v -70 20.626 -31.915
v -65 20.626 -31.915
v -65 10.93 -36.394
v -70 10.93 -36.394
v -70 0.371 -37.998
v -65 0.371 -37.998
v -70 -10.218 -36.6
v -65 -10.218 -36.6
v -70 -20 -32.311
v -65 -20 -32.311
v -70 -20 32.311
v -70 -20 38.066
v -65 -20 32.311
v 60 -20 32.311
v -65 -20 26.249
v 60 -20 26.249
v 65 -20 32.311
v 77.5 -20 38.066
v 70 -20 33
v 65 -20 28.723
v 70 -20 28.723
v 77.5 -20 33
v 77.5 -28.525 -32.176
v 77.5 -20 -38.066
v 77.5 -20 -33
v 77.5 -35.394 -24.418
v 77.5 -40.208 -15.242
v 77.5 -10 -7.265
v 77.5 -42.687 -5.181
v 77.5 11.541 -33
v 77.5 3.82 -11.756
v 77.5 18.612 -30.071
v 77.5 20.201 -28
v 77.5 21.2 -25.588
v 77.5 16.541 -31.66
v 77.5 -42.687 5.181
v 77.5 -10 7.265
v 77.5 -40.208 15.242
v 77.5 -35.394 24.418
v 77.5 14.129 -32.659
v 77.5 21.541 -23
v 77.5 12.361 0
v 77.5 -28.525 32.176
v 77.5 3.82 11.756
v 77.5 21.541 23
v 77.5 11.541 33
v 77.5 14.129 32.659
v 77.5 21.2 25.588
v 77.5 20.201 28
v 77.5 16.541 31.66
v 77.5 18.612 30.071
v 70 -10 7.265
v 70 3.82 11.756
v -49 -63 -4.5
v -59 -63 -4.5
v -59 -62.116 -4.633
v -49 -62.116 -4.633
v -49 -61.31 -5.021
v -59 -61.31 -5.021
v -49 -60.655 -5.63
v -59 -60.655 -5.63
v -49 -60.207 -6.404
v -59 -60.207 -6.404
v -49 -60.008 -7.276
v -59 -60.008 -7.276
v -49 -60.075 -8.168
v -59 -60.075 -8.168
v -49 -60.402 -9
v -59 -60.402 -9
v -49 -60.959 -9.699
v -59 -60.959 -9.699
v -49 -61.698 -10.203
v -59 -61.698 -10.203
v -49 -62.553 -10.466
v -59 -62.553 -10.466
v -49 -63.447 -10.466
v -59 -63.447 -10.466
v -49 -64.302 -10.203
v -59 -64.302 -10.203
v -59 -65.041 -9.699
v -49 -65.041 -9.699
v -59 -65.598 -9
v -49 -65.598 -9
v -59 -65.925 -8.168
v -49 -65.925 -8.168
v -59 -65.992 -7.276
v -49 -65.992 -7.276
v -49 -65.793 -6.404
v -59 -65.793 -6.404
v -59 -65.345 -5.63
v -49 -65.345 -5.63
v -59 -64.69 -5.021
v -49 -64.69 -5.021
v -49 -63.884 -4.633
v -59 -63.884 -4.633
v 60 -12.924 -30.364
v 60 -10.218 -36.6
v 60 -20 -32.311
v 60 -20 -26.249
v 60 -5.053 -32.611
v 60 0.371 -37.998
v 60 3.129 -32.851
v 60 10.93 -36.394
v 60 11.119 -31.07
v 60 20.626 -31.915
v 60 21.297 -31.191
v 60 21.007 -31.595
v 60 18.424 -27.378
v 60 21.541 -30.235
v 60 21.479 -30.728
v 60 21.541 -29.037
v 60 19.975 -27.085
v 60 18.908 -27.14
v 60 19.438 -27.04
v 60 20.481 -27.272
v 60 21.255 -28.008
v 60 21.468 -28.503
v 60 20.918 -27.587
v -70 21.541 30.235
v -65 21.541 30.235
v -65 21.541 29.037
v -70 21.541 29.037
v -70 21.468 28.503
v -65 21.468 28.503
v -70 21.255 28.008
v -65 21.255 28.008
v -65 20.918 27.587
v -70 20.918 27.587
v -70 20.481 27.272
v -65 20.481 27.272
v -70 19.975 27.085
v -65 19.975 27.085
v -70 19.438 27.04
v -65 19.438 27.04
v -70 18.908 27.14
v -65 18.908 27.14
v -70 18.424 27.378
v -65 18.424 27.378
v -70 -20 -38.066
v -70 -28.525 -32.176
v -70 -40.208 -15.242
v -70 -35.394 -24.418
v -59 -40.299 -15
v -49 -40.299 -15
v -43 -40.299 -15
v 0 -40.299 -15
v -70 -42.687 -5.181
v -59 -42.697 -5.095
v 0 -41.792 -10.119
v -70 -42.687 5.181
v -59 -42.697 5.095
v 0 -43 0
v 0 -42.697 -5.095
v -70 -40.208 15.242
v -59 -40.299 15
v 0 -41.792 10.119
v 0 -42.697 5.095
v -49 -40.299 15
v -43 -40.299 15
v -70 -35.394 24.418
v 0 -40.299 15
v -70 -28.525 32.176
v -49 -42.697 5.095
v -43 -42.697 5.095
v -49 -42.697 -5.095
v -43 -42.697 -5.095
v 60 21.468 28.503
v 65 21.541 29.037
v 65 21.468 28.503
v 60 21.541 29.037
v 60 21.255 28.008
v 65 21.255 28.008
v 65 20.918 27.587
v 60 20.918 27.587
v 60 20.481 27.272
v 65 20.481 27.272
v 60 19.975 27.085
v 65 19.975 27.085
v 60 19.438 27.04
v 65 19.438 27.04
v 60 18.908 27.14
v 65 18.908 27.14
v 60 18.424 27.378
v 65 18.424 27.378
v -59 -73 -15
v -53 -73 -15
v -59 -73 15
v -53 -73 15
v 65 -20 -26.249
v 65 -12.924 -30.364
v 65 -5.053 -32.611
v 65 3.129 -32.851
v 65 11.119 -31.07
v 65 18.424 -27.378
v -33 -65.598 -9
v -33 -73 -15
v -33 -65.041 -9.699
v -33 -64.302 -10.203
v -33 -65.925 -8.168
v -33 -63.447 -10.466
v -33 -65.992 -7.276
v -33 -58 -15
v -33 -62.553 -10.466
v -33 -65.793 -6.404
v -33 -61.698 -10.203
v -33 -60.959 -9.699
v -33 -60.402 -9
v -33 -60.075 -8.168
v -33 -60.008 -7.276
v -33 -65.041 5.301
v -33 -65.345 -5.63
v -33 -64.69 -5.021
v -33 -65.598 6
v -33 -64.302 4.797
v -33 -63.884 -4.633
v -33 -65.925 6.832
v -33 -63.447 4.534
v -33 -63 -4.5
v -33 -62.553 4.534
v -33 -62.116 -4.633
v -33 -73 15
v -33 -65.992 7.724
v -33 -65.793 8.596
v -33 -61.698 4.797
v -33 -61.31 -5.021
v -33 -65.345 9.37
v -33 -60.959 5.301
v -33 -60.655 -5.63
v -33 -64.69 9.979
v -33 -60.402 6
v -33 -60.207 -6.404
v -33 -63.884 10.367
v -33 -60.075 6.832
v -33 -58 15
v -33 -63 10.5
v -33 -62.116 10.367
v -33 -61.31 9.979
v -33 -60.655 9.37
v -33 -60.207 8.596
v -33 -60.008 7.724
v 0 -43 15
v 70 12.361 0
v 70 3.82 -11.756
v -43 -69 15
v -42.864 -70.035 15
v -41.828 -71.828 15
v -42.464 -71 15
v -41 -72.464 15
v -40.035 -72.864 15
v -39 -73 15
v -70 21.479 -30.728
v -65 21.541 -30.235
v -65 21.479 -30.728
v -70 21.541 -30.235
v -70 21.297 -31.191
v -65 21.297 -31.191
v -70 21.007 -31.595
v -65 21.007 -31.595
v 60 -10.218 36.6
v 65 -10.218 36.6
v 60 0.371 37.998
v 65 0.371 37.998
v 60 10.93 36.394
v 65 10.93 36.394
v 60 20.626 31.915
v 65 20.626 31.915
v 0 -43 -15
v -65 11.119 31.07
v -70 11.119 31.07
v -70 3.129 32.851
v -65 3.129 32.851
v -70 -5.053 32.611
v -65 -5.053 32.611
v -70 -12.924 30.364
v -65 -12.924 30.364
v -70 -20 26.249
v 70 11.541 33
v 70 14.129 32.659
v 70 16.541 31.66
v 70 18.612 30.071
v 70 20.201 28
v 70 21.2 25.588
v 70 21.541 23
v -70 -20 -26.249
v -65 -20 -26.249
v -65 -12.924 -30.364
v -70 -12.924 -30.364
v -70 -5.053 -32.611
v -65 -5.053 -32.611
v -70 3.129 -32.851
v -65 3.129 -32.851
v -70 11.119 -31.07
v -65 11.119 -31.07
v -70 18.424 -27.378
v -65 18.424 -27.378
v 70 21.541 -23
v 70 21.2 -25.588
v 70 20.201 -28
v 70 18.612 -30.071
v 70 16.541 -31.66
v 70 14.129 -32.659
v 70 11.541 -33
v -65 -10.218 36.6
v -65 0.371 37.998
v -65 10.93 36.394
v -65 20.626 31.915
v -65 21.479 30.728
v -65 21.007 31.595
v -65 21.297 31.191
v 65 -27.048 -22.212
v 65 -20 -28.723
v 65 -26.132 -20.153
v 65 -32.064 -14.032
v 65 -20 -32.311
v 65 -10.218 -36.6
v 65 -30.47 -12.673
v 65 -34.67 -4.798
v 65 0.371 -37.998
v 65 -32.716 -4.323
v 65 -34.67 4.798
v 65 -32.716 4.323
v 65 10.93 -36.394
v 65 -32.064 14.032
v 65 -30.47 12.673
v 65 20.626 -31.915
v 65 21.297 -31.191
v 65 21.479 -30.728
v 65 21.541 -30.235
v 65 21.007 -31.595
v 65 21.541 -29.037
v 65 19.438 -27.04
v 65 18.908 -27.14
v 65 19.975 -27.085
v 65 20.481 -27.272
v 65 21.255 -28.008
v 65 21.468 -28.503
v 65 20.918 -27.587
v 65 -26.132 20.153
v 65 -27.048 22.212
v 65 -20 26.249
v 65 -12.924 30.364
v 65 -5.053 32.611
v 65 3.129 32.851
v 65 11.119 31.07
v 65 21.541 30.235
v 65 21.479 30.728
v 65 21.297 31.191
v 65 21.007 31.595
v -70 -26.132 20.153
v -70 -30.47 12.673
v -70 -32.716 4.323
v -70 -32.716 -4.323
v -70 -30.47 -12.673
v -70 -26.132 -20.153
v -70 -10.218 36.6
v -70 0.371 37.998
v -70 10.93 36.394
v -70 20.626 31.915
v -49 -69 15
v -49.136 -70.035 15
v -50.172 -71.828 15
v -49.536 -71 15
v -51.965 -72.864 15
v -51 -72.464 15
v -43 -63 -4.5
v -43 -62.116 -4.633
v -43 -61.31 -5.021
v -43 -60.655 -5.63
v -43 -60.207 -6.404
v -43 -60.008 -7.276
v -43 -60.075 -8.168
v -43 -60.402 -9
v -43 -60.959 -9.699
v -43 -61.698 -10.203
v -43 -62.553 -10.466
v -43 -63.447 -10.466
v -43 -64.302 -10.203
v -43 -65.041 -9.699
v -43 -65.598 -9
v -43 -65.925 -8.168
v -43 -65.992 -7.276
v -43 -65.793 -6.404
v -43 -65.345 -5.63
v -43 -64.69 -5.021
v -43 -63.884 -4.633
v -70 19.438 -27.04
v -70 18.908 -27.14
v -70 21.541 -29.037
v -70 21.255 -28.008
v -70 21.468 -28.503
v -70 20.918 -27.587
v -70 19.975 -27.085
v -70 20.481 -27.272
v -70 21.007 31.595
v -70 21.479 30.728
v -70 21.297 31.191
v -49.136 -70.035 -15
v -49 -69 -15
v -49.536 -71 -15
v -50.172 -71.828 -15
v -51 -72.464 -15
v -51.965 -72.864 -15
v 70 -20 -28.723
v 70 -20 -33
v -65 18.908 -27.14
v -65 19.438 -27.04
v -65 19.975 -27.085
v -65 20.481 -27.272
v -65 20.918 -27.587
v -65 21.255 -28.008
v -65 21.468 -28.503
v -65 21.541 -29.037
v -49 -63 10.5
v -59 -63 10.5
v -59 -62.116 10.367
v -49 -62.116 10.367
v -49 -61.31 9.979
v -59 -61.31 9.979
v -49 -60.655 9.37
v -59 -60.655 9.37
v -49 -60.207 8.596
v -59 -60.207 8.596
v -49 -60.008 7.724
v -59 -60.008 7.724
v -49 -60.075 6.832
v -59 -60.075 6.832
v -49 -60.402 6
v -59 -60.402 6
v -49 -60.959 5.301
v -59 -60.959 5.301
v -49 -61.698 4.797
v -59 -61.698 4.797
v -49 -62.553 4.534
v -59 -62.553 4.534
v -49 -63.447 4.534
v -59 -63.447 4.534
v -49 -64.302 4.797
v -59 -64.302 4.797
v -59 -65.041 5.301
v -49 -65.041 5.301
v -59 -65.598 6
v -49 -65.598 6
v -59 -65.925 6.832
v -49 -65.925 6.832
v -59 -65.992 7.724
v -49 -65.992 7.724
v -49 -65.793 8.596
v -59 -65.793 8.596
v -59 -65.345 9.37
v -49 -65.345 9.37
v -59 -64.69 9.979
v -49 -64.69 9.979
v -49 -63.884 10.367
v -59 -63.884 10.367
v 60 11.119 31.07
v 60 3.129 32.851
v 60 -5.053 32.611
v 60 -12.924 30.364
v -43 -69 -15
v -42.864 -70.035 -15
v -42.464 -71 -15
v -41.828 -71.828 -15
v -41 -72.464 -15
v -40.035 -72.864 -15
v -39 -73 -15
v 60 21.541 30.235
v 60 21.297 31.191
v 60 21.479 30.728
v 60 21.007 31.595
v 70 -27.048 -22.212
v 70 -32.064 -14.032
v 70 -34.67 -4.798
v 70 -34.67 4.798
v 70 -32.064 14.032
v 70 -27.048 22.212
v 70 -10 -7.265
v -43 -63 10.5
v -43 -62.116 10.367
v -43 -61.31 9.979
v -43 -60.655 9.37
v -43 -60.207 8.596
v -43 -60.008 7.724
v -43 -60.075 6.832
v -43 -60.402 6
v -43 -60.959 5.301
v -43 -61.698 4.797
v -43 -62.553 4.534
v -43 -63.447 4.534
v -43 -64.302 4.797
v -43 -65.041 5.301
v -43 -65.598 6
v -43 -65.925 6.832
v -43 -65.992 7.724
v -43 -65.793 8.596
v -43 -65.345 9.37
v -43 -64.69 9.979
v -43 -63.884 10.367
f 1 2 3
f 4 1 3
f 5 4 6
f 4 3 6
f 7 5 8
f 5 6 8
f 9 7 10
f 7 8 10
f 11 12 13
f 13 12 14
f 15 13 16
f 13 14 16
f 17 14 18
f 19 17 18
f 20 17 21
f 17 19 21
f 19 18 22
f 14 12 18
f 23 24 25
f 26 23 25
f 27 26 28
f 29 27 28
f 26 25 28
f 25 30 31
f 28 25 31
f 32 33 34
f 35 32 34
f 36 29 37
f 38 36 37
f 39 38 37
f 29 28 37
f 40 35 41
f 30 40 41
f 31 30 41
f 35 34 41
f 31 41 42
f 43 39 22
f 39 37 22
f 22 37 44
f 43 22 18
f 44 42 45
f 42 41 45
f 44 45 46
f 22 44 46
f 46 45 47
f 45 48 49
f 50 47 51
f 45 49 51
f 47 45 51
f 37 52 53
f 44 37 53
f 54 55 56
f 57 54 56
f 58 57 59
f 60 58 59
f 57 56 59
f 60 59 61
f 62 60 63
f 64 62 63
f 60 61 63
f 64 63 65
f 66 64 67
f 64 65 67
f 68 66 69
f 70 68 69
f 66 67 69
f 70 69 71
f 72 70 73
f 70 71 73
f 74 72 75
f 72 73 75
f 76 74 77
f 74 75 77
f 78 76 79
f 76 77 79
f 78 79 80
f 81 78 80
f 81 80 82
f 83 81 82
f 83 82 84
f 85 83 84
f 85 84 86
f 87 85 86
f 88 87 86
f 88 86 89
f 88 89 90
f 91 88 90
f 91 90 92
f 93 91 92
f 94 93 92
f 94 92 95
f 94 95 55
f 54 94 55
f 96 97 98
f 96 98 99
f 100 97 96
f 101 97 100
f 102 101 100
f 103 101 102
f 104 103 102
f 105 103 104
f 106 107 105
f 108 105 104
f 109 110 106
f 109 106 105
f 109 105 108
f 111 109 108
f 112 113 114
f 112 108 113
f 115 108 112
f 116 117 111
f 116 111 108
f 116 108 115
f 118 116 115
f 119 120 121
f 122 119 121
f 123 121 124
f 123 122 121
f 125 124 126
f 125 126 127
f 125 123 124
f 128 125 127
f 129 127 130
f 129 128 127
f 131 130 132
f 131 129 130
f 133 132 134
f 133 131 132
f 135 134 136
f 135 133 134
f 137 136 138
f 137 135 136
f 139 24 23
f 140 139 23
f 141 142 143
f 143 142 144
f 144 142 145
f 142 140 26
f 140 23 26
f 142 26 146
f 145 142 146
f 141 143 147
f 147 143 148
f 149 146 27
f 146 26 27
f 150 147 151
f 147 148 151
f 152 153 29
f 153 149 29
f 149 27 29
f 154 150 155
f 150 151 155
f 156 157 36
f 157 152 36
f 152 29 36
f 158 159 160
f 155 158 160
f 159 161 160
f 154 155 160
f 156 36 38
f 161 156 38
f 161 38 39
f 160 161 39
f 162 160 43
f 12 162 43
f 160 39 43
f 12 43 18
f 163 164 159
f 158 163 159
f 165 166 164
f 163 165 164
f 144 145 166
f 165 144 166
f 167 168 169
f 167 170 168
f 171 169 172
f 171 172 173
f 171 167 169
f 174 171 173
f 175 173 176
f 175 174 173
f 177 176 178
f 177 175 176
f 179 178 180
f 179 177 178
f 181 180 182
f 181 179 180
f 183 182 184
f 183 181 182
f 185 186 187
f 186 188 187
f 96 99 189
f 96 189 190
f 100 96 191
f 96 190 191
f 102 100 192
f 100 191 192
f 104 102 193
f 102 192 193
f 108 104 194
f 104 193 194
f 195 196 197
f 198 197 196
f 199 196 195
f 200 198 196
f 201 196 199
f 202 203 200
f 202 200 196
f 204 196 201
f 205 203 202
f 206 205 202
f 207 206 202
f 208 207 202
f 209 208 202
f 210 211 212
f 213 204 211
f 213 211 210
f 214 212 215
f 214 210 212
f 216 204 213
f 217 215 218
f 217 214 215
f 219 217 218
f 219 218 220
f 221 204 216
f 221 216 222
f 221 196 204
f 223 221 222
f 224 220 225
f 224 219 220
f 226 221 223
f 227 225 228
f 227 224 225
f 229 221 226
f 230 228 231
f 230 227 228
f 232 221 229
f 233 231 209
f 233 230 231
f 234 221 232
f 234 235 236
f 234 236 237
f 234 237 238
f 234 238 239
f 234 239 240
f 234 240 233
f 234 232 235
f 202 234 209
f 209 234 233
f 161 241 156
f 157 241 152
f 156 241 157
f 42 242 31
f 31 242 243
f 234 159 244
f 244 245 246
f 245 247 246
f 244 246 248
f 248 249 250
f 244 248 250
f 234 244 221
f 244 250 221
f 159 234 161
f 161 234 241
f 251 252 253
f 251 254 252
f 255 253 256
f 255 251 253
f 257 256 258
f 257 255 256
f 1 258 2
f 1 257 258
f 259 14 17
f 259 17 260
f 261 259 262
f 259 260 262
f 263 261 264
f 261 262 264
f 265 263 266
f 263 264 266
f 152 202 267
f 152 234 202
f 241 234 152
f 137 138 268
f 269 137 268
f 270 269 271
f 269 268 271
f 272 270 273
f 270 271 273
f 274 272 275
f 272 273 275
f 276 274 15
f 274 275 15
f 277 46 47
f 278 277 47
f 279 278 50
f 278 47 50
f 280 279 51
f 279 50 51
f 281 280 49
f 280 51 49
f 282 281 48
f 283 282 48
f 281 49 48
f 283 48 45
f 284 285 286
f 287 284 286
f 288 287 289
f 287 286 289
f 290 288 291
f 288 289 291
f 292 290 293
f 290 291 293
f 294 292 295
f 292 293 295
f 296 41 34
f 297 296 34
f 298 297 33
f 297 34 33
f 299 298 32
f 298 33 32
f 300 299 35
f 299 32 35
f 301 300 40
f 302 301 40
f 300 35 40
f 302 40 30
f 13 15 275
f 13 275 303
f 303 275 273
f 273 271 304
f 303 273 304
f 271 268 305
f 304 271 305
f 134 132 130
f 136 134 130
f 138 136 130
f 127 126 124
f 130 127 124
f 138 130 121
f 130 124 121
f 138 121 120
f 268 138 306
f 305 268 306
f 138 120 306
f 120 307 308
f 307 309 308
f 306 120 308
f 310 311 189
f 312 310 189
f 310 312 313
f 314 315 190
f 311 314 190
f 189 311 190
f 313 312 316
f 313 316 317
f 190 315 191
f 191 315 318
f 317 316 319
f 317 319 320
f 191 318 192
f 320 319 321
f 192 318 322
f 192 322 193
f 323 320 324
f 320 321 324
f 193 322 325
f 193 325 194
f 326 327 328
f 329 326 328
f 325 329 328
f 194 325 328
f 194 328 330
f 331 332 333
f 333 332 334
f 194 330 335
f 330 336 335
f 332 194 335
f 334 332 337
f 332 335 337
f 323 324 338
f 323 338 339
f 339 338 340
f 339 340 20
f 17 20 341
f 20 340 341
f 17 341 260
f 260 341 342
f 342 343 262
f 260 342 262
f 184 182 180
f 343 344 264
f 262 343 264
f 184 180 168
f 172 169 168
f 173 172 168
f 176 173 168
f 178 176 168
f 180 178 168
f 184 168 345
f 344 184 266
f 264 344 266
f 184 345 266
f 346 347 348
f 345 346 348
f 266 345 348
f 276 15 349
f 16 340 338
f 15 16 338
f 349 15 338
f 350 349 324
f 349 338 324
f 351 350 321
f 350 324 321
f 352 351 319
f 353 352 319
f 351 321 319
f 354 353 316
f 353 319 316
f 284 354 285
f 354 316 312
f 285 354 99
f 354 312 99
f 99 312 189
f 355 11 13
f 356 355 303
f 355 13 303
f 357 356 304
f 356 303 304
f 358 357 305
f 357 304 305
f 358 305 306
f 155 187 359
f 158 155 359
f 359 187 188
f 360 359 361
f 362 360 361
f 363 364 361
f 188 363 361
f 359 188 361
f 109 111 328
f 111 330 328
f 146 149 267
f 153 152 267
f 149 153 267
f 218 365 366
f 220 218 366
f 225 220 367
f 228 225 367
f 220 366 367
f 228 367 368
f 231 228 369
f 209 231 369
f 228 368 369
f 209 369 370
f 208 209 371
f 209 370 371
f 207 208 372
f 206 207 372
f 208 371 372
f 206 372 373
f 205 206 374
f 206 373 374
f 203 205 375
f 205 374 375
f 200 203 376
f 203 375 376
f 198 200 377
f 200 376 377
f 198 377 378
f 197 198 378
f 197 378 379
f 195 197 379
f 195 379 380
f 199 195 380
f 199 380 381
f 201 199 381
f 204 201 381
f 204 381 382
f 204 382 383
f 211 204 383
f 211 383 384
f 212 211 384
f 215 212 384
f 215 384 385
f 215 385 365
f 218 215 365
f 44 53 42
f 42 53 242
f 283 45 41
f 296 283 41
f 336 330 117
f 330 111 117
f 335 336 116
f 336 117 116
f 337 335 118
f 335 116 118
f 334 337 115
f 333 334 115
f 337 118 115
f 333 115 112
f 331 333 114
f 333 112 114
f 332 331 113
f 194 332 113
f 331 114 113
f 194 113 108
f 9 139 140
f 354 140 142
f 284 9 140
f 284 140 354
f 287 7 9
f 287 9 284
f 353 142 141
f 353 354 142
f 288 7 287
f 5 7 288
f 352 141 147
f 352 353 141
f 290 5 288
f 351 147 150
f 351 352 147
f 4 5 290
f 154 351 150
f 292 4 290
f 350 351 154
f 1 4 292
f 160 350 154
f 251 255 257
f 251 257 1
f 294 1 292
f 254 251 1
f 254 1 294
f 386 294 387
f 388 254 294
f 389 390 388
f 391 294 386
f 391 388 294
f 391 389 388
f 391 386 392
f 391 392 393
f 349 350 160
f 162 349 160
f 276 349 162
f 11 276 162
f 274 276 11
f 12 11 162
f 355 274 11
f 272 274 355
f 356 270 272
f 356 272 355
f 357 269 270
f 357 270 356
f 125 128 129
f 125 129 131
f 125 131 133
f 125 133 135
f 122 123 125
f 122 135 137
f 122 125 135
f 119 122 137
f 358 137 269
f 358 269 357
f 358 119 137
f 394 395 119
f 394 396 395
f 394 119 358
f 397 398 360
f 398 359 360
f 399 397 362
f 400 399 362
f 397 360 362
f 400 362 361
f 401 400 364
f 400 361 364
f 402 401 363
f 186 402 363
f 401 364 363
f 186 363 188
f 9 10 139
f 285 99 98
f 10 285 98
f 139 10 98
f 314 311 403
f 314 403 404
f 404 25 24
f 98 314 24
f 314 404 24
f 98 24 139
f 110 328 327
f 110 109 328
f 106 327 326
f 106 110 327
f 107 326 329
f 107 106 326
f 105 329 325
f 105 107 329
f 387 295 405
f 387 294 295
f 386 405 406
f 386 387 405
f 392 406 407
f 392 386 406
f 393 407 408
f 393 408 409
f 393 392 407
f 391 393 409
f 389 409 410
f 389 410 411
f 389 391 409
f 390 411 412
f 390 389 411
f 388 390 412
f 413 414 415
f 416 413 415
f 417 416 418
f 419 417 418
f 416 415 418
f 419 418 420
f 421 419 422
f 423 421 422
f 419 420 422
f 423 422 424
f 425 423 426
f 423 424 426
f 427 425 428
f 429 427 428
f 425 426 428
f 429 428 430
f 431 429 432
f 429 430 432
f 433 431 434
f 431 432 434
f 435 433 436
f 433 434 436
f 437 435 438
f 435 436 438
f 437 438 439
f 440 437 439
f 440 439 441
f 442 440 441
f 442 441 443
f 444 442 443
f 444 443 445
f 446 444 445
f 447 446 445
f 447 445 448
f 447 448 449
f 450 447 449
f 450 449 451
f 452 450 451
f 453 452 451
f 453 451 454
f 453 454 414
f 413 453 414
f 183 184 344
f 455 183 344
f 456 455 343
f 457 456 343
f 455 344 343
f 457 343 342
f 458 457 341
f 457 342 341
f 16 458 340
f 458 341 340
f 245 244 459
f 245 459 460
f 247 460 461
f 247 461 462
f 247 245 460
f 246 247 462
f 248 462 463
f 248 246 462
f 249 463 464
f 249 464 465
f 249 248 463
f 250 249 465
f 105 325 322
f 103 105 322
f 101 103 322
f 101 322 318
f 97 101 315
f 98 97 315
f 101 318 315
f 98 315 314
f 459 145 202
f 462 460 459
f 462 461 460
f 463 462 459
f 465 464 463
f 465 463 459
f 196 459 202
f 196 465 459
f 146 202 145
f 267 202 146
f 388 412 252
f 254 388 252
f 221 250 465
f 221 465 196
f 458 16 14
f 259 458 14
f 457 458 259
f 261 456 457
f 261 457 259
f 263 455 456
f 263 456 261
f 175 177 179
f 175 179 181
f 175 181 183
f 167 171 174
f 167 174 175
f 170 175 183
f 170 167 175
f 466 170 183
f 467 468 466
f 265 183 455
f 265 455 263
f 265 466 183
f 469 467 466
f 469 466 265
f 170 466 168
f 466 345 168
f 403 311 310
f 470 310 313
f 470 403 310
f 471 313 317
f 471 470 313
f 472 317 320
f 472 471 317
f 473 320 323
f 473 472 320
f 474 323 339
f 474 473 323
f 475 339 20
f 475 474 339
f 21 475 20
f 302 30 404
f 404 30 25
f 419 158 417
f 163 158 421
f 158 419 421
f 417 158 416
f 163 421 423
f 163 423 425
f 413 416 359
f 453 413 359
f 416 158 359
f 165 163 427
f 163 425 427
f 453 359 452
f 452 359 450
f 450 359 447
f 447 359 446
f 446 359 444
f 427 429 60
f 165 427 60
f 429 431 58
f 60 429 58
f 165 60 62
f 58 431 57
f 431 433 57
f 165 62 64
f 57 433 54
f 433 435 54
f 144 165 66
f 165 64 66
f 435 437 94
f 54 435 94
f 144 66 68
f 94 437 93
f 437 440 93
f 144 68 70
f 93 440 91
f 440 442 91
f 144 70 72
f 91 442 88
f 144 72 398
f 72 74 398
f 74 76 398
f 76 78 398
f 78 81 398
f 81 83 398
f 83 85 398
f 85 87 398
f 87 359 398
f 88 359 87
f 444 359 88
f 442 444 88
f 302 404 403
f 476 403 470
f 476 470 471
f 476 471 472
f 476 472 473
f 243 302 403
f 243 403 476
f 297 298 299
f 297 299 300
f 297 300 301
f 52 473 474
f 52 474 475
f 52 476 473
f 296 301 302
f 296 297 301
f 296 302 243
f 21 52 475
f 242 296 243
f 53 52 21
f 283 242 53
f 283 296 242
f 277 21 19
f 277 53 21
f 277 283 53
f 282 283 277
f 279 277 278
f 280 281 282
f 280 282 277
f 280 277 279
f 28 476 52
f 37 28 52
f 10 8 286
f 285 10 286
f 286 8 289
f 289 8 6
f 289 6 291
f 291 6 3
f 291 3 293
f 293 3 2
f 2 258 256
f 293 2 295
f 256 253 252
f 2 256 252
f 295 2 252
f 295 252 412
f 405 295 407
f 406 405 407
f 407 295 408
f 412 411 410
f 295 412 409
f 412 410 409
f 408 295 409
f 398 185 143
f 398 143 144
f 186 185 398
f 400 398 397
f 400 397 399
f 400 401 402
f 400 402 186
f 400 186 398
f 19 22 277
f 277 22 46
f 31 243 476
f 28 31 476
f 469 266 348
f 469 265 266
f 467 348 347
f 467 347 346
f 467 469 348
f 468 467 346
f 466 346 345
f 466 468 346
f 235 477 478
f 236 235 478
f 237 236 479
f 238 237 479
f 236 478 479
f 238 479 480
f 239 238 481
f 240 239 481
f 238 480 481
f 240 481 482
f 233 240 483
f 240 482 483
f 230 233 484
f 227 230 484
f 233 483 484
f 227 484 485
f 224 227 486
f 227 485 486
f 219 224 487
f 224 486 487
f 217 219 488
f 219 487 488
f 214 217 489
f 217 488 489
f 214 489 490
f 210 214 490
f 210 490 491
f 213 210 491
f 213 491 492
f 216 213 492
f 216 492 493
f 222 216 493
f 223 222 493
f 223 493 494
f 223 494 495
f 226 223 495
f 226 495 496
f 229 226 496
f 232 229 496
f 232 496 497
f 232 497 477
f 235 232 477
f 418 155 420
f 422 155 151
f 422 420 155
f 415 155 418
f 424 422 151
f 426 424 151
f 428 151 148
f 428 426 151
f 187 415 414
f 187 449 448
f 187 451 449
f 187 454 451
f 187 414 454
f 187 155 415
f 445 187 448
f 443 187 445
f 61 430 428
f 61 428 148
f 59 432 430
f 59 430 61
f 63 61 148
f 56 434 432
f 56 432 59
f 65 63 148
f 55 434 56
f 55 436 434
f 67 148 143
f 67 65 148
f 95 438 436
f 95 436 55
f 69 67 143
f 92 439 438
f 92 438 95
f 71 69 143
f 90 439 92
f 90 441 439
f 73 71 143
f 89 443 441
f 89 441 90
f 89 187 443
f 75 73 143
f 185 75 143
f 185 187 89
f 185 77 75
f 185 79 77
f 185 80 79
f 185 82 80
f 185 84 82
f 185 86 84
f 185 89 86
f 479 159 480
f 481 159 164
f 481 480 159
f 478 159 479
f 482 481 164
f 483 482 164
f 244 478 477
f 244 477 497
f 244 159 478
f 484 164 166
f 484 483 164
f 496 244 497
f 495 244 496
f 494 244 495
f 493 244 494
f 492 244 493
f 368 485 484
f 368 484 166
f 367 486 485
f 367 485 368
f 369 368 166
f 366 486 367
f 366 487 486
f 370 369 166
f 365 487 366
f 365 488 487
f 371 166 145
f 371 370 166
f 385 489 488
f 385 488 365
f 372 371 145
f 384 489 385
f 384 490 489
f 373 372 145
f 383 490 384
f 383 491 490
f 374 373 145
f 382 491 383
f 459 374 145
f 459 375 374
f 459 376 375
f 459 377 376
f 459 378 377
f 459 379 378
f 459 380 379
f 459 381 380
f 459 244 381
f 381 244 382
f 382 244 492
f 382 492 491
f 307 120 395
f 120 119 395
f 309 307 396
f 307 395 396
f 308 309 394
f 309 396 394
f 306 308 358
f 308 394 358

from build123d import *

# Parameters (mm, degrees)
BOSS_EXTRUDE1_DEPTH   = 70
BOSS_EXTRUDE2_START   = -5
BOSS_EXTRUDE2_DEPTH   = 5
BOSS_EXTRUDE3_START   = 7.5
BOSS_EXTRUDE3_DEPTH   = 7.5
BOSS_EXTRUDE4_DEPTH   = 15
BOSS_EXTRUDE4_2_DEPTH = 15
BOSS_EXTRUDE6_REACH   = 109.8
SKETCH5_W             = 43
SKETCH5_H             = 30
SKETCH5_W_2           = 10
CUT_EXTRUDE1_REACH    = 161.406
SKETCH6_R             = 3
SKETCH7_R             = 35
CUT_EXTRUDE2_DEPTH    = 5
LPATTERN1_COUNT       = 2
LPATTERN1_PITCH       = 130
FILLET1_R             = 2
CUT_EXTRUDE3_REACH    = 164.413


with BuildPart() as part:
    # Sketch1 → Boss-Extrude1 (new, symmetric)
    with BuildSketch(Plane(origin=(0, 0, 0), x_dir=(0, 0, -1), z_dir=(1, 0, 0))):
        with BuildLine():
            Line((-38.065732621, -20), (-26.248809497, -20))
            ThreePointArc((-26.248809497, -20), (0, -33), (26.248809497, -20))
            Line((26.248809497, -20), (38.065732621, -20))
            ThreePointArc((38.065732621, -20), (0, -43), (-38.065732621, -20))
        make_face()
    extrude(amount=BOSS_EXTRUDE1_DEPTH, both=True)

    # Sketch2 → Boss-Extrude2 (add)
    with BuildSketch(Plane(origin=(70, 0, 0), x_dir=(0, 0, -1), z_dir=(1, 0, 0)).offset(BOSS_EXTRUDE2_START)):
        with BuildLine():
            Line((-31.304951685, 21.540659229), (-25, 21.540659229))
            ThreePointArc((-25, 21.540659229), (0, -33), (25, 21.540659229))
            Line((25, 21.540659229), (31.304951685, 21.540659229))
            ThreePointArc((31.304951685, 21.540659229), (0, -38), (-31.304951685, 21.540659229))
        make_face()
    boss_extrude2 = extrude(amount=-BOSS_EXTRUDE2_DEPTH)

    # Sketch3 → Boss-Extrude3 (add)
    with BuildSketch(Plane(origin=(70, 0, 0), x_dir=(0, 0, -1), z_dir=(1, 0, 0)).offset(BOSS_EXTRUDE3_START)):
        with BuildLine():
            Line((-33, -20), (-33, 11.540659229))
            ThreePointArc((-33, 11.540659229), (-30.071067812, 18.61172704), (-23, 21.540659229))
            Line((-23, 21.540659229), (23, 21.540659229))
            ThreePointArc((23, 21.540659229), (30.071067812, 18.61172704), (33, 11.540659229))
            Line((33, 11.540659229), (33, -20))
            Line((33, -20), (38.065732621, -20))
            ThreePointArc((38.065732621, -20), (0, -43), (-38.065732621, -20))
            Line((-38.065732621, -20), (-33, -20))
        make_face()
    extrude(amount=-BOSS_EXTRUDE3_DEPTH)

    # Sketch5 → Boss-Extrude6 (add, up to next)
    with BuildSketch(Plane(origin=(0, -43, 0), x_dir=(1, 0, 0), z_dir=(0, 1, 0)), mode=Mode.PRIVATE) as boss_extrude6_sk1:
        with Locations((-21.5, 0)):
            Rectangle(SKETCH5_W, SKETCH5_H)
    boss_extrude6_tool1 = extrude(boss_extrude6_sk1.sketch, amount=BOSS_EXTRUDE6_REACH, mode=Mode.PRIVATE) - part.part
    # Sketch5 → Boss-Extrude6 (add, up to next)
    with BuildSketch(Plane(origin=(0, -43, 0), x_dir=(1, 0, 0), z_dir=(0, 1, 0)), mode=Mode.PRIVATE) as boss_extrude6_sk2:
        with Locations((-54, 0)):
            Rectangle(SKETCH5_W_2, SKETCH5_H)
    boss_extrude6_tool2 = extrude(boss_extrude6_sk2.sketch, amount=BOSS_EXTRUDE6_REACH, mode=Mode.PRIVATE) - part.part


with BuildPart() as body_2:
    # Sketch4 → Boss-Extrude4 (new, symmetric)
    with BuildSketch(Plane.XY):
        with BuildLine():
            Line((-49, -43), (-49, -69))
            ThreePointArc((-49, -69), (-50.171572875, -71.828427125), (-53, -73))
            Line((-53, -73), (-59, -73))
            Line((-59, -73), (-59, -43))
            Line((-59, -43), (-49, -43))
        make_face()
    extrude(amount=BOSS_EXTRUDE4_DEPTH, both=True)


with BuildPart() as body_3:
    # Sketch4 → Boss-Extrude4 2 (new, symmetric)
    with BuildSketch(Plane.XY):
        with BuildLine():
            Line((-33, -43), (-43, -43))
            Line((-43, -43), (-43, -69))
            ThreePointArc((-43, -69), (-41.828427125, -71.828427125), (-39, -73))
            Line((-39, -73), (-33, -73))
            Line((-33, -73), (-33, -58))
            Line((-33, -58), (0, -43))
            Line((0, -43), (-33, -43))
        make_face()
    extrude(amount=BOSS_EXTRUDE4_2_DEPTH, both=True)


with BuildPart() as part_1:
    add(part.part)

    add(body_2.part)  # Boss-Extrude6 merges body 2

    add(body_3.part)  # Boss-Extrude6 merges body 3
    add(boss_extrude6_tool1.solids().sort_by_distance((-21.5, -43, 0))[0])
    add(boss_extrude6_tool1.solids().sort_by_distance((-21.5, -43, 0))[1])
    add(boss_extrude6_tool2.solids().sort_by_distance((-54, -43, 0))[0])
    add(boss_extrude6_tool2.solids().sort_by_distance((-54, -43, 0))[1])

    # Cut-Extrude1: up to this face of the body (flat: up to its plane)
    cut_extrude1_end = Plane(part_1.part.faces().sort_by_distance((-33, -65.5, 0))[0])
    # Sketch6 → Cut-Extrude1 (cut, up to the picked face)
    with BuildSketch(Plane.ZY.offset(59), mode=Mode.PRIVATE) as cut_extrude1_sk1:
        with Locations((-7.5, -63)):
            Circle(SKETCH6_R)
    cut_extrude1_tool1 = split(extrude(cut_extrude1_sk1.sketch, amount=-CUT_EXTRUDE1_REACH, mode=Mode.PRIVATE), bisect_by=cut_extrude1_end, keep=Keep.BOTH, mode=Mode.PRIVATE)
    # Sketch6 → Cut-Extrude1 (cut, up to the picked face)
    with BuildSketch(Plane.ZY.offset(59), mode=Mode.PRIVATE) as cut_extrude1_sk2:
        with Locations((7.5, -63)):
            Circle(SKETCH6_R)
    cut_extrude1_tool2 = split(extrude(cut_extrude1_sk2.sketch, amount=-CUT_EXTRUDE1_REACH, mode=Mode.PRIVATE), bisect_by=cut_extrude1_end, keep=Keep.BOTH, mode=Mode.PRIVATE)
    add(cut_extrude1_tool1.solids().sort_by(Axis((-59, -63, -7.5), (1, 0, 0)))[0], mode=Mode.SUBTRACT)
    add(cut_extrude1_tool2.solids().sort_by(Axis((-59, -63, 7.5), (1, 0, 0)))[0], mode=Mode.SUBTRACT)

    # Sketch7 → Cut-Extrude2 (cut)
    with BuildSketch(Plane.ZY.offset(-70)):
        Circle(SKETCH7_R)
    extrude(amount=CUT_EXTRUDE2_DEPTH, mode=Mode.SUBTRACT)

    # LPattern1: Boss-Extrude2 ×2
    with Locations(*[(-i * LPATTERN1_PITCH, 0, 0) for i in range(1, LPATTERN1_COUNT)]):
        add(boss_extrude2)

    # Fillet1
    fillet1_edges = [part_1.edges().sort_by_distance(p)[0] for p in [
        (62.5, 21.540659229, 25),
        (62.5, 21.540659229, -31.304951685),
        (-67.5, 21.540659229, 25),
        (-67.5, 21.540659229, -31.304951685),
        (-67.5, 21.540659229, -25),
        (-67.5, 21.540659229, 31.304951685),
        (62.5, 21.540659229, -25),
        (62.5, 21.540659229, 31.304951685),
    ]]
    fillet(fillet1_edges, radius=FILLET1_R)

    # Sketch8 → Cut-Extrude3 (cut, up to next)
    with BuildSketch(Plane.ZY.offset(-70), mode=Mode.PRIVATE) as cut_extrude3_sk1:
        Polygon((0, 12.360679775), (-11.755705046, 3.819660113), (-7.26542528, -10), (7.26542528, -10), (11.755705046, 3.819660113), align=None)
    cut_extrude3_tool1 = extrude(cut_extrude3_sk1.sketch, amount=-CUT_EXTRUDE3_REACH, mode=Mode.PRIVATE) & part_1.part
    add(cut_extrude3_tool1.solids().sort_by_distance((70, 0, 0))[0], mode=Mode.SUBTRACT)


solid = part_1.part
